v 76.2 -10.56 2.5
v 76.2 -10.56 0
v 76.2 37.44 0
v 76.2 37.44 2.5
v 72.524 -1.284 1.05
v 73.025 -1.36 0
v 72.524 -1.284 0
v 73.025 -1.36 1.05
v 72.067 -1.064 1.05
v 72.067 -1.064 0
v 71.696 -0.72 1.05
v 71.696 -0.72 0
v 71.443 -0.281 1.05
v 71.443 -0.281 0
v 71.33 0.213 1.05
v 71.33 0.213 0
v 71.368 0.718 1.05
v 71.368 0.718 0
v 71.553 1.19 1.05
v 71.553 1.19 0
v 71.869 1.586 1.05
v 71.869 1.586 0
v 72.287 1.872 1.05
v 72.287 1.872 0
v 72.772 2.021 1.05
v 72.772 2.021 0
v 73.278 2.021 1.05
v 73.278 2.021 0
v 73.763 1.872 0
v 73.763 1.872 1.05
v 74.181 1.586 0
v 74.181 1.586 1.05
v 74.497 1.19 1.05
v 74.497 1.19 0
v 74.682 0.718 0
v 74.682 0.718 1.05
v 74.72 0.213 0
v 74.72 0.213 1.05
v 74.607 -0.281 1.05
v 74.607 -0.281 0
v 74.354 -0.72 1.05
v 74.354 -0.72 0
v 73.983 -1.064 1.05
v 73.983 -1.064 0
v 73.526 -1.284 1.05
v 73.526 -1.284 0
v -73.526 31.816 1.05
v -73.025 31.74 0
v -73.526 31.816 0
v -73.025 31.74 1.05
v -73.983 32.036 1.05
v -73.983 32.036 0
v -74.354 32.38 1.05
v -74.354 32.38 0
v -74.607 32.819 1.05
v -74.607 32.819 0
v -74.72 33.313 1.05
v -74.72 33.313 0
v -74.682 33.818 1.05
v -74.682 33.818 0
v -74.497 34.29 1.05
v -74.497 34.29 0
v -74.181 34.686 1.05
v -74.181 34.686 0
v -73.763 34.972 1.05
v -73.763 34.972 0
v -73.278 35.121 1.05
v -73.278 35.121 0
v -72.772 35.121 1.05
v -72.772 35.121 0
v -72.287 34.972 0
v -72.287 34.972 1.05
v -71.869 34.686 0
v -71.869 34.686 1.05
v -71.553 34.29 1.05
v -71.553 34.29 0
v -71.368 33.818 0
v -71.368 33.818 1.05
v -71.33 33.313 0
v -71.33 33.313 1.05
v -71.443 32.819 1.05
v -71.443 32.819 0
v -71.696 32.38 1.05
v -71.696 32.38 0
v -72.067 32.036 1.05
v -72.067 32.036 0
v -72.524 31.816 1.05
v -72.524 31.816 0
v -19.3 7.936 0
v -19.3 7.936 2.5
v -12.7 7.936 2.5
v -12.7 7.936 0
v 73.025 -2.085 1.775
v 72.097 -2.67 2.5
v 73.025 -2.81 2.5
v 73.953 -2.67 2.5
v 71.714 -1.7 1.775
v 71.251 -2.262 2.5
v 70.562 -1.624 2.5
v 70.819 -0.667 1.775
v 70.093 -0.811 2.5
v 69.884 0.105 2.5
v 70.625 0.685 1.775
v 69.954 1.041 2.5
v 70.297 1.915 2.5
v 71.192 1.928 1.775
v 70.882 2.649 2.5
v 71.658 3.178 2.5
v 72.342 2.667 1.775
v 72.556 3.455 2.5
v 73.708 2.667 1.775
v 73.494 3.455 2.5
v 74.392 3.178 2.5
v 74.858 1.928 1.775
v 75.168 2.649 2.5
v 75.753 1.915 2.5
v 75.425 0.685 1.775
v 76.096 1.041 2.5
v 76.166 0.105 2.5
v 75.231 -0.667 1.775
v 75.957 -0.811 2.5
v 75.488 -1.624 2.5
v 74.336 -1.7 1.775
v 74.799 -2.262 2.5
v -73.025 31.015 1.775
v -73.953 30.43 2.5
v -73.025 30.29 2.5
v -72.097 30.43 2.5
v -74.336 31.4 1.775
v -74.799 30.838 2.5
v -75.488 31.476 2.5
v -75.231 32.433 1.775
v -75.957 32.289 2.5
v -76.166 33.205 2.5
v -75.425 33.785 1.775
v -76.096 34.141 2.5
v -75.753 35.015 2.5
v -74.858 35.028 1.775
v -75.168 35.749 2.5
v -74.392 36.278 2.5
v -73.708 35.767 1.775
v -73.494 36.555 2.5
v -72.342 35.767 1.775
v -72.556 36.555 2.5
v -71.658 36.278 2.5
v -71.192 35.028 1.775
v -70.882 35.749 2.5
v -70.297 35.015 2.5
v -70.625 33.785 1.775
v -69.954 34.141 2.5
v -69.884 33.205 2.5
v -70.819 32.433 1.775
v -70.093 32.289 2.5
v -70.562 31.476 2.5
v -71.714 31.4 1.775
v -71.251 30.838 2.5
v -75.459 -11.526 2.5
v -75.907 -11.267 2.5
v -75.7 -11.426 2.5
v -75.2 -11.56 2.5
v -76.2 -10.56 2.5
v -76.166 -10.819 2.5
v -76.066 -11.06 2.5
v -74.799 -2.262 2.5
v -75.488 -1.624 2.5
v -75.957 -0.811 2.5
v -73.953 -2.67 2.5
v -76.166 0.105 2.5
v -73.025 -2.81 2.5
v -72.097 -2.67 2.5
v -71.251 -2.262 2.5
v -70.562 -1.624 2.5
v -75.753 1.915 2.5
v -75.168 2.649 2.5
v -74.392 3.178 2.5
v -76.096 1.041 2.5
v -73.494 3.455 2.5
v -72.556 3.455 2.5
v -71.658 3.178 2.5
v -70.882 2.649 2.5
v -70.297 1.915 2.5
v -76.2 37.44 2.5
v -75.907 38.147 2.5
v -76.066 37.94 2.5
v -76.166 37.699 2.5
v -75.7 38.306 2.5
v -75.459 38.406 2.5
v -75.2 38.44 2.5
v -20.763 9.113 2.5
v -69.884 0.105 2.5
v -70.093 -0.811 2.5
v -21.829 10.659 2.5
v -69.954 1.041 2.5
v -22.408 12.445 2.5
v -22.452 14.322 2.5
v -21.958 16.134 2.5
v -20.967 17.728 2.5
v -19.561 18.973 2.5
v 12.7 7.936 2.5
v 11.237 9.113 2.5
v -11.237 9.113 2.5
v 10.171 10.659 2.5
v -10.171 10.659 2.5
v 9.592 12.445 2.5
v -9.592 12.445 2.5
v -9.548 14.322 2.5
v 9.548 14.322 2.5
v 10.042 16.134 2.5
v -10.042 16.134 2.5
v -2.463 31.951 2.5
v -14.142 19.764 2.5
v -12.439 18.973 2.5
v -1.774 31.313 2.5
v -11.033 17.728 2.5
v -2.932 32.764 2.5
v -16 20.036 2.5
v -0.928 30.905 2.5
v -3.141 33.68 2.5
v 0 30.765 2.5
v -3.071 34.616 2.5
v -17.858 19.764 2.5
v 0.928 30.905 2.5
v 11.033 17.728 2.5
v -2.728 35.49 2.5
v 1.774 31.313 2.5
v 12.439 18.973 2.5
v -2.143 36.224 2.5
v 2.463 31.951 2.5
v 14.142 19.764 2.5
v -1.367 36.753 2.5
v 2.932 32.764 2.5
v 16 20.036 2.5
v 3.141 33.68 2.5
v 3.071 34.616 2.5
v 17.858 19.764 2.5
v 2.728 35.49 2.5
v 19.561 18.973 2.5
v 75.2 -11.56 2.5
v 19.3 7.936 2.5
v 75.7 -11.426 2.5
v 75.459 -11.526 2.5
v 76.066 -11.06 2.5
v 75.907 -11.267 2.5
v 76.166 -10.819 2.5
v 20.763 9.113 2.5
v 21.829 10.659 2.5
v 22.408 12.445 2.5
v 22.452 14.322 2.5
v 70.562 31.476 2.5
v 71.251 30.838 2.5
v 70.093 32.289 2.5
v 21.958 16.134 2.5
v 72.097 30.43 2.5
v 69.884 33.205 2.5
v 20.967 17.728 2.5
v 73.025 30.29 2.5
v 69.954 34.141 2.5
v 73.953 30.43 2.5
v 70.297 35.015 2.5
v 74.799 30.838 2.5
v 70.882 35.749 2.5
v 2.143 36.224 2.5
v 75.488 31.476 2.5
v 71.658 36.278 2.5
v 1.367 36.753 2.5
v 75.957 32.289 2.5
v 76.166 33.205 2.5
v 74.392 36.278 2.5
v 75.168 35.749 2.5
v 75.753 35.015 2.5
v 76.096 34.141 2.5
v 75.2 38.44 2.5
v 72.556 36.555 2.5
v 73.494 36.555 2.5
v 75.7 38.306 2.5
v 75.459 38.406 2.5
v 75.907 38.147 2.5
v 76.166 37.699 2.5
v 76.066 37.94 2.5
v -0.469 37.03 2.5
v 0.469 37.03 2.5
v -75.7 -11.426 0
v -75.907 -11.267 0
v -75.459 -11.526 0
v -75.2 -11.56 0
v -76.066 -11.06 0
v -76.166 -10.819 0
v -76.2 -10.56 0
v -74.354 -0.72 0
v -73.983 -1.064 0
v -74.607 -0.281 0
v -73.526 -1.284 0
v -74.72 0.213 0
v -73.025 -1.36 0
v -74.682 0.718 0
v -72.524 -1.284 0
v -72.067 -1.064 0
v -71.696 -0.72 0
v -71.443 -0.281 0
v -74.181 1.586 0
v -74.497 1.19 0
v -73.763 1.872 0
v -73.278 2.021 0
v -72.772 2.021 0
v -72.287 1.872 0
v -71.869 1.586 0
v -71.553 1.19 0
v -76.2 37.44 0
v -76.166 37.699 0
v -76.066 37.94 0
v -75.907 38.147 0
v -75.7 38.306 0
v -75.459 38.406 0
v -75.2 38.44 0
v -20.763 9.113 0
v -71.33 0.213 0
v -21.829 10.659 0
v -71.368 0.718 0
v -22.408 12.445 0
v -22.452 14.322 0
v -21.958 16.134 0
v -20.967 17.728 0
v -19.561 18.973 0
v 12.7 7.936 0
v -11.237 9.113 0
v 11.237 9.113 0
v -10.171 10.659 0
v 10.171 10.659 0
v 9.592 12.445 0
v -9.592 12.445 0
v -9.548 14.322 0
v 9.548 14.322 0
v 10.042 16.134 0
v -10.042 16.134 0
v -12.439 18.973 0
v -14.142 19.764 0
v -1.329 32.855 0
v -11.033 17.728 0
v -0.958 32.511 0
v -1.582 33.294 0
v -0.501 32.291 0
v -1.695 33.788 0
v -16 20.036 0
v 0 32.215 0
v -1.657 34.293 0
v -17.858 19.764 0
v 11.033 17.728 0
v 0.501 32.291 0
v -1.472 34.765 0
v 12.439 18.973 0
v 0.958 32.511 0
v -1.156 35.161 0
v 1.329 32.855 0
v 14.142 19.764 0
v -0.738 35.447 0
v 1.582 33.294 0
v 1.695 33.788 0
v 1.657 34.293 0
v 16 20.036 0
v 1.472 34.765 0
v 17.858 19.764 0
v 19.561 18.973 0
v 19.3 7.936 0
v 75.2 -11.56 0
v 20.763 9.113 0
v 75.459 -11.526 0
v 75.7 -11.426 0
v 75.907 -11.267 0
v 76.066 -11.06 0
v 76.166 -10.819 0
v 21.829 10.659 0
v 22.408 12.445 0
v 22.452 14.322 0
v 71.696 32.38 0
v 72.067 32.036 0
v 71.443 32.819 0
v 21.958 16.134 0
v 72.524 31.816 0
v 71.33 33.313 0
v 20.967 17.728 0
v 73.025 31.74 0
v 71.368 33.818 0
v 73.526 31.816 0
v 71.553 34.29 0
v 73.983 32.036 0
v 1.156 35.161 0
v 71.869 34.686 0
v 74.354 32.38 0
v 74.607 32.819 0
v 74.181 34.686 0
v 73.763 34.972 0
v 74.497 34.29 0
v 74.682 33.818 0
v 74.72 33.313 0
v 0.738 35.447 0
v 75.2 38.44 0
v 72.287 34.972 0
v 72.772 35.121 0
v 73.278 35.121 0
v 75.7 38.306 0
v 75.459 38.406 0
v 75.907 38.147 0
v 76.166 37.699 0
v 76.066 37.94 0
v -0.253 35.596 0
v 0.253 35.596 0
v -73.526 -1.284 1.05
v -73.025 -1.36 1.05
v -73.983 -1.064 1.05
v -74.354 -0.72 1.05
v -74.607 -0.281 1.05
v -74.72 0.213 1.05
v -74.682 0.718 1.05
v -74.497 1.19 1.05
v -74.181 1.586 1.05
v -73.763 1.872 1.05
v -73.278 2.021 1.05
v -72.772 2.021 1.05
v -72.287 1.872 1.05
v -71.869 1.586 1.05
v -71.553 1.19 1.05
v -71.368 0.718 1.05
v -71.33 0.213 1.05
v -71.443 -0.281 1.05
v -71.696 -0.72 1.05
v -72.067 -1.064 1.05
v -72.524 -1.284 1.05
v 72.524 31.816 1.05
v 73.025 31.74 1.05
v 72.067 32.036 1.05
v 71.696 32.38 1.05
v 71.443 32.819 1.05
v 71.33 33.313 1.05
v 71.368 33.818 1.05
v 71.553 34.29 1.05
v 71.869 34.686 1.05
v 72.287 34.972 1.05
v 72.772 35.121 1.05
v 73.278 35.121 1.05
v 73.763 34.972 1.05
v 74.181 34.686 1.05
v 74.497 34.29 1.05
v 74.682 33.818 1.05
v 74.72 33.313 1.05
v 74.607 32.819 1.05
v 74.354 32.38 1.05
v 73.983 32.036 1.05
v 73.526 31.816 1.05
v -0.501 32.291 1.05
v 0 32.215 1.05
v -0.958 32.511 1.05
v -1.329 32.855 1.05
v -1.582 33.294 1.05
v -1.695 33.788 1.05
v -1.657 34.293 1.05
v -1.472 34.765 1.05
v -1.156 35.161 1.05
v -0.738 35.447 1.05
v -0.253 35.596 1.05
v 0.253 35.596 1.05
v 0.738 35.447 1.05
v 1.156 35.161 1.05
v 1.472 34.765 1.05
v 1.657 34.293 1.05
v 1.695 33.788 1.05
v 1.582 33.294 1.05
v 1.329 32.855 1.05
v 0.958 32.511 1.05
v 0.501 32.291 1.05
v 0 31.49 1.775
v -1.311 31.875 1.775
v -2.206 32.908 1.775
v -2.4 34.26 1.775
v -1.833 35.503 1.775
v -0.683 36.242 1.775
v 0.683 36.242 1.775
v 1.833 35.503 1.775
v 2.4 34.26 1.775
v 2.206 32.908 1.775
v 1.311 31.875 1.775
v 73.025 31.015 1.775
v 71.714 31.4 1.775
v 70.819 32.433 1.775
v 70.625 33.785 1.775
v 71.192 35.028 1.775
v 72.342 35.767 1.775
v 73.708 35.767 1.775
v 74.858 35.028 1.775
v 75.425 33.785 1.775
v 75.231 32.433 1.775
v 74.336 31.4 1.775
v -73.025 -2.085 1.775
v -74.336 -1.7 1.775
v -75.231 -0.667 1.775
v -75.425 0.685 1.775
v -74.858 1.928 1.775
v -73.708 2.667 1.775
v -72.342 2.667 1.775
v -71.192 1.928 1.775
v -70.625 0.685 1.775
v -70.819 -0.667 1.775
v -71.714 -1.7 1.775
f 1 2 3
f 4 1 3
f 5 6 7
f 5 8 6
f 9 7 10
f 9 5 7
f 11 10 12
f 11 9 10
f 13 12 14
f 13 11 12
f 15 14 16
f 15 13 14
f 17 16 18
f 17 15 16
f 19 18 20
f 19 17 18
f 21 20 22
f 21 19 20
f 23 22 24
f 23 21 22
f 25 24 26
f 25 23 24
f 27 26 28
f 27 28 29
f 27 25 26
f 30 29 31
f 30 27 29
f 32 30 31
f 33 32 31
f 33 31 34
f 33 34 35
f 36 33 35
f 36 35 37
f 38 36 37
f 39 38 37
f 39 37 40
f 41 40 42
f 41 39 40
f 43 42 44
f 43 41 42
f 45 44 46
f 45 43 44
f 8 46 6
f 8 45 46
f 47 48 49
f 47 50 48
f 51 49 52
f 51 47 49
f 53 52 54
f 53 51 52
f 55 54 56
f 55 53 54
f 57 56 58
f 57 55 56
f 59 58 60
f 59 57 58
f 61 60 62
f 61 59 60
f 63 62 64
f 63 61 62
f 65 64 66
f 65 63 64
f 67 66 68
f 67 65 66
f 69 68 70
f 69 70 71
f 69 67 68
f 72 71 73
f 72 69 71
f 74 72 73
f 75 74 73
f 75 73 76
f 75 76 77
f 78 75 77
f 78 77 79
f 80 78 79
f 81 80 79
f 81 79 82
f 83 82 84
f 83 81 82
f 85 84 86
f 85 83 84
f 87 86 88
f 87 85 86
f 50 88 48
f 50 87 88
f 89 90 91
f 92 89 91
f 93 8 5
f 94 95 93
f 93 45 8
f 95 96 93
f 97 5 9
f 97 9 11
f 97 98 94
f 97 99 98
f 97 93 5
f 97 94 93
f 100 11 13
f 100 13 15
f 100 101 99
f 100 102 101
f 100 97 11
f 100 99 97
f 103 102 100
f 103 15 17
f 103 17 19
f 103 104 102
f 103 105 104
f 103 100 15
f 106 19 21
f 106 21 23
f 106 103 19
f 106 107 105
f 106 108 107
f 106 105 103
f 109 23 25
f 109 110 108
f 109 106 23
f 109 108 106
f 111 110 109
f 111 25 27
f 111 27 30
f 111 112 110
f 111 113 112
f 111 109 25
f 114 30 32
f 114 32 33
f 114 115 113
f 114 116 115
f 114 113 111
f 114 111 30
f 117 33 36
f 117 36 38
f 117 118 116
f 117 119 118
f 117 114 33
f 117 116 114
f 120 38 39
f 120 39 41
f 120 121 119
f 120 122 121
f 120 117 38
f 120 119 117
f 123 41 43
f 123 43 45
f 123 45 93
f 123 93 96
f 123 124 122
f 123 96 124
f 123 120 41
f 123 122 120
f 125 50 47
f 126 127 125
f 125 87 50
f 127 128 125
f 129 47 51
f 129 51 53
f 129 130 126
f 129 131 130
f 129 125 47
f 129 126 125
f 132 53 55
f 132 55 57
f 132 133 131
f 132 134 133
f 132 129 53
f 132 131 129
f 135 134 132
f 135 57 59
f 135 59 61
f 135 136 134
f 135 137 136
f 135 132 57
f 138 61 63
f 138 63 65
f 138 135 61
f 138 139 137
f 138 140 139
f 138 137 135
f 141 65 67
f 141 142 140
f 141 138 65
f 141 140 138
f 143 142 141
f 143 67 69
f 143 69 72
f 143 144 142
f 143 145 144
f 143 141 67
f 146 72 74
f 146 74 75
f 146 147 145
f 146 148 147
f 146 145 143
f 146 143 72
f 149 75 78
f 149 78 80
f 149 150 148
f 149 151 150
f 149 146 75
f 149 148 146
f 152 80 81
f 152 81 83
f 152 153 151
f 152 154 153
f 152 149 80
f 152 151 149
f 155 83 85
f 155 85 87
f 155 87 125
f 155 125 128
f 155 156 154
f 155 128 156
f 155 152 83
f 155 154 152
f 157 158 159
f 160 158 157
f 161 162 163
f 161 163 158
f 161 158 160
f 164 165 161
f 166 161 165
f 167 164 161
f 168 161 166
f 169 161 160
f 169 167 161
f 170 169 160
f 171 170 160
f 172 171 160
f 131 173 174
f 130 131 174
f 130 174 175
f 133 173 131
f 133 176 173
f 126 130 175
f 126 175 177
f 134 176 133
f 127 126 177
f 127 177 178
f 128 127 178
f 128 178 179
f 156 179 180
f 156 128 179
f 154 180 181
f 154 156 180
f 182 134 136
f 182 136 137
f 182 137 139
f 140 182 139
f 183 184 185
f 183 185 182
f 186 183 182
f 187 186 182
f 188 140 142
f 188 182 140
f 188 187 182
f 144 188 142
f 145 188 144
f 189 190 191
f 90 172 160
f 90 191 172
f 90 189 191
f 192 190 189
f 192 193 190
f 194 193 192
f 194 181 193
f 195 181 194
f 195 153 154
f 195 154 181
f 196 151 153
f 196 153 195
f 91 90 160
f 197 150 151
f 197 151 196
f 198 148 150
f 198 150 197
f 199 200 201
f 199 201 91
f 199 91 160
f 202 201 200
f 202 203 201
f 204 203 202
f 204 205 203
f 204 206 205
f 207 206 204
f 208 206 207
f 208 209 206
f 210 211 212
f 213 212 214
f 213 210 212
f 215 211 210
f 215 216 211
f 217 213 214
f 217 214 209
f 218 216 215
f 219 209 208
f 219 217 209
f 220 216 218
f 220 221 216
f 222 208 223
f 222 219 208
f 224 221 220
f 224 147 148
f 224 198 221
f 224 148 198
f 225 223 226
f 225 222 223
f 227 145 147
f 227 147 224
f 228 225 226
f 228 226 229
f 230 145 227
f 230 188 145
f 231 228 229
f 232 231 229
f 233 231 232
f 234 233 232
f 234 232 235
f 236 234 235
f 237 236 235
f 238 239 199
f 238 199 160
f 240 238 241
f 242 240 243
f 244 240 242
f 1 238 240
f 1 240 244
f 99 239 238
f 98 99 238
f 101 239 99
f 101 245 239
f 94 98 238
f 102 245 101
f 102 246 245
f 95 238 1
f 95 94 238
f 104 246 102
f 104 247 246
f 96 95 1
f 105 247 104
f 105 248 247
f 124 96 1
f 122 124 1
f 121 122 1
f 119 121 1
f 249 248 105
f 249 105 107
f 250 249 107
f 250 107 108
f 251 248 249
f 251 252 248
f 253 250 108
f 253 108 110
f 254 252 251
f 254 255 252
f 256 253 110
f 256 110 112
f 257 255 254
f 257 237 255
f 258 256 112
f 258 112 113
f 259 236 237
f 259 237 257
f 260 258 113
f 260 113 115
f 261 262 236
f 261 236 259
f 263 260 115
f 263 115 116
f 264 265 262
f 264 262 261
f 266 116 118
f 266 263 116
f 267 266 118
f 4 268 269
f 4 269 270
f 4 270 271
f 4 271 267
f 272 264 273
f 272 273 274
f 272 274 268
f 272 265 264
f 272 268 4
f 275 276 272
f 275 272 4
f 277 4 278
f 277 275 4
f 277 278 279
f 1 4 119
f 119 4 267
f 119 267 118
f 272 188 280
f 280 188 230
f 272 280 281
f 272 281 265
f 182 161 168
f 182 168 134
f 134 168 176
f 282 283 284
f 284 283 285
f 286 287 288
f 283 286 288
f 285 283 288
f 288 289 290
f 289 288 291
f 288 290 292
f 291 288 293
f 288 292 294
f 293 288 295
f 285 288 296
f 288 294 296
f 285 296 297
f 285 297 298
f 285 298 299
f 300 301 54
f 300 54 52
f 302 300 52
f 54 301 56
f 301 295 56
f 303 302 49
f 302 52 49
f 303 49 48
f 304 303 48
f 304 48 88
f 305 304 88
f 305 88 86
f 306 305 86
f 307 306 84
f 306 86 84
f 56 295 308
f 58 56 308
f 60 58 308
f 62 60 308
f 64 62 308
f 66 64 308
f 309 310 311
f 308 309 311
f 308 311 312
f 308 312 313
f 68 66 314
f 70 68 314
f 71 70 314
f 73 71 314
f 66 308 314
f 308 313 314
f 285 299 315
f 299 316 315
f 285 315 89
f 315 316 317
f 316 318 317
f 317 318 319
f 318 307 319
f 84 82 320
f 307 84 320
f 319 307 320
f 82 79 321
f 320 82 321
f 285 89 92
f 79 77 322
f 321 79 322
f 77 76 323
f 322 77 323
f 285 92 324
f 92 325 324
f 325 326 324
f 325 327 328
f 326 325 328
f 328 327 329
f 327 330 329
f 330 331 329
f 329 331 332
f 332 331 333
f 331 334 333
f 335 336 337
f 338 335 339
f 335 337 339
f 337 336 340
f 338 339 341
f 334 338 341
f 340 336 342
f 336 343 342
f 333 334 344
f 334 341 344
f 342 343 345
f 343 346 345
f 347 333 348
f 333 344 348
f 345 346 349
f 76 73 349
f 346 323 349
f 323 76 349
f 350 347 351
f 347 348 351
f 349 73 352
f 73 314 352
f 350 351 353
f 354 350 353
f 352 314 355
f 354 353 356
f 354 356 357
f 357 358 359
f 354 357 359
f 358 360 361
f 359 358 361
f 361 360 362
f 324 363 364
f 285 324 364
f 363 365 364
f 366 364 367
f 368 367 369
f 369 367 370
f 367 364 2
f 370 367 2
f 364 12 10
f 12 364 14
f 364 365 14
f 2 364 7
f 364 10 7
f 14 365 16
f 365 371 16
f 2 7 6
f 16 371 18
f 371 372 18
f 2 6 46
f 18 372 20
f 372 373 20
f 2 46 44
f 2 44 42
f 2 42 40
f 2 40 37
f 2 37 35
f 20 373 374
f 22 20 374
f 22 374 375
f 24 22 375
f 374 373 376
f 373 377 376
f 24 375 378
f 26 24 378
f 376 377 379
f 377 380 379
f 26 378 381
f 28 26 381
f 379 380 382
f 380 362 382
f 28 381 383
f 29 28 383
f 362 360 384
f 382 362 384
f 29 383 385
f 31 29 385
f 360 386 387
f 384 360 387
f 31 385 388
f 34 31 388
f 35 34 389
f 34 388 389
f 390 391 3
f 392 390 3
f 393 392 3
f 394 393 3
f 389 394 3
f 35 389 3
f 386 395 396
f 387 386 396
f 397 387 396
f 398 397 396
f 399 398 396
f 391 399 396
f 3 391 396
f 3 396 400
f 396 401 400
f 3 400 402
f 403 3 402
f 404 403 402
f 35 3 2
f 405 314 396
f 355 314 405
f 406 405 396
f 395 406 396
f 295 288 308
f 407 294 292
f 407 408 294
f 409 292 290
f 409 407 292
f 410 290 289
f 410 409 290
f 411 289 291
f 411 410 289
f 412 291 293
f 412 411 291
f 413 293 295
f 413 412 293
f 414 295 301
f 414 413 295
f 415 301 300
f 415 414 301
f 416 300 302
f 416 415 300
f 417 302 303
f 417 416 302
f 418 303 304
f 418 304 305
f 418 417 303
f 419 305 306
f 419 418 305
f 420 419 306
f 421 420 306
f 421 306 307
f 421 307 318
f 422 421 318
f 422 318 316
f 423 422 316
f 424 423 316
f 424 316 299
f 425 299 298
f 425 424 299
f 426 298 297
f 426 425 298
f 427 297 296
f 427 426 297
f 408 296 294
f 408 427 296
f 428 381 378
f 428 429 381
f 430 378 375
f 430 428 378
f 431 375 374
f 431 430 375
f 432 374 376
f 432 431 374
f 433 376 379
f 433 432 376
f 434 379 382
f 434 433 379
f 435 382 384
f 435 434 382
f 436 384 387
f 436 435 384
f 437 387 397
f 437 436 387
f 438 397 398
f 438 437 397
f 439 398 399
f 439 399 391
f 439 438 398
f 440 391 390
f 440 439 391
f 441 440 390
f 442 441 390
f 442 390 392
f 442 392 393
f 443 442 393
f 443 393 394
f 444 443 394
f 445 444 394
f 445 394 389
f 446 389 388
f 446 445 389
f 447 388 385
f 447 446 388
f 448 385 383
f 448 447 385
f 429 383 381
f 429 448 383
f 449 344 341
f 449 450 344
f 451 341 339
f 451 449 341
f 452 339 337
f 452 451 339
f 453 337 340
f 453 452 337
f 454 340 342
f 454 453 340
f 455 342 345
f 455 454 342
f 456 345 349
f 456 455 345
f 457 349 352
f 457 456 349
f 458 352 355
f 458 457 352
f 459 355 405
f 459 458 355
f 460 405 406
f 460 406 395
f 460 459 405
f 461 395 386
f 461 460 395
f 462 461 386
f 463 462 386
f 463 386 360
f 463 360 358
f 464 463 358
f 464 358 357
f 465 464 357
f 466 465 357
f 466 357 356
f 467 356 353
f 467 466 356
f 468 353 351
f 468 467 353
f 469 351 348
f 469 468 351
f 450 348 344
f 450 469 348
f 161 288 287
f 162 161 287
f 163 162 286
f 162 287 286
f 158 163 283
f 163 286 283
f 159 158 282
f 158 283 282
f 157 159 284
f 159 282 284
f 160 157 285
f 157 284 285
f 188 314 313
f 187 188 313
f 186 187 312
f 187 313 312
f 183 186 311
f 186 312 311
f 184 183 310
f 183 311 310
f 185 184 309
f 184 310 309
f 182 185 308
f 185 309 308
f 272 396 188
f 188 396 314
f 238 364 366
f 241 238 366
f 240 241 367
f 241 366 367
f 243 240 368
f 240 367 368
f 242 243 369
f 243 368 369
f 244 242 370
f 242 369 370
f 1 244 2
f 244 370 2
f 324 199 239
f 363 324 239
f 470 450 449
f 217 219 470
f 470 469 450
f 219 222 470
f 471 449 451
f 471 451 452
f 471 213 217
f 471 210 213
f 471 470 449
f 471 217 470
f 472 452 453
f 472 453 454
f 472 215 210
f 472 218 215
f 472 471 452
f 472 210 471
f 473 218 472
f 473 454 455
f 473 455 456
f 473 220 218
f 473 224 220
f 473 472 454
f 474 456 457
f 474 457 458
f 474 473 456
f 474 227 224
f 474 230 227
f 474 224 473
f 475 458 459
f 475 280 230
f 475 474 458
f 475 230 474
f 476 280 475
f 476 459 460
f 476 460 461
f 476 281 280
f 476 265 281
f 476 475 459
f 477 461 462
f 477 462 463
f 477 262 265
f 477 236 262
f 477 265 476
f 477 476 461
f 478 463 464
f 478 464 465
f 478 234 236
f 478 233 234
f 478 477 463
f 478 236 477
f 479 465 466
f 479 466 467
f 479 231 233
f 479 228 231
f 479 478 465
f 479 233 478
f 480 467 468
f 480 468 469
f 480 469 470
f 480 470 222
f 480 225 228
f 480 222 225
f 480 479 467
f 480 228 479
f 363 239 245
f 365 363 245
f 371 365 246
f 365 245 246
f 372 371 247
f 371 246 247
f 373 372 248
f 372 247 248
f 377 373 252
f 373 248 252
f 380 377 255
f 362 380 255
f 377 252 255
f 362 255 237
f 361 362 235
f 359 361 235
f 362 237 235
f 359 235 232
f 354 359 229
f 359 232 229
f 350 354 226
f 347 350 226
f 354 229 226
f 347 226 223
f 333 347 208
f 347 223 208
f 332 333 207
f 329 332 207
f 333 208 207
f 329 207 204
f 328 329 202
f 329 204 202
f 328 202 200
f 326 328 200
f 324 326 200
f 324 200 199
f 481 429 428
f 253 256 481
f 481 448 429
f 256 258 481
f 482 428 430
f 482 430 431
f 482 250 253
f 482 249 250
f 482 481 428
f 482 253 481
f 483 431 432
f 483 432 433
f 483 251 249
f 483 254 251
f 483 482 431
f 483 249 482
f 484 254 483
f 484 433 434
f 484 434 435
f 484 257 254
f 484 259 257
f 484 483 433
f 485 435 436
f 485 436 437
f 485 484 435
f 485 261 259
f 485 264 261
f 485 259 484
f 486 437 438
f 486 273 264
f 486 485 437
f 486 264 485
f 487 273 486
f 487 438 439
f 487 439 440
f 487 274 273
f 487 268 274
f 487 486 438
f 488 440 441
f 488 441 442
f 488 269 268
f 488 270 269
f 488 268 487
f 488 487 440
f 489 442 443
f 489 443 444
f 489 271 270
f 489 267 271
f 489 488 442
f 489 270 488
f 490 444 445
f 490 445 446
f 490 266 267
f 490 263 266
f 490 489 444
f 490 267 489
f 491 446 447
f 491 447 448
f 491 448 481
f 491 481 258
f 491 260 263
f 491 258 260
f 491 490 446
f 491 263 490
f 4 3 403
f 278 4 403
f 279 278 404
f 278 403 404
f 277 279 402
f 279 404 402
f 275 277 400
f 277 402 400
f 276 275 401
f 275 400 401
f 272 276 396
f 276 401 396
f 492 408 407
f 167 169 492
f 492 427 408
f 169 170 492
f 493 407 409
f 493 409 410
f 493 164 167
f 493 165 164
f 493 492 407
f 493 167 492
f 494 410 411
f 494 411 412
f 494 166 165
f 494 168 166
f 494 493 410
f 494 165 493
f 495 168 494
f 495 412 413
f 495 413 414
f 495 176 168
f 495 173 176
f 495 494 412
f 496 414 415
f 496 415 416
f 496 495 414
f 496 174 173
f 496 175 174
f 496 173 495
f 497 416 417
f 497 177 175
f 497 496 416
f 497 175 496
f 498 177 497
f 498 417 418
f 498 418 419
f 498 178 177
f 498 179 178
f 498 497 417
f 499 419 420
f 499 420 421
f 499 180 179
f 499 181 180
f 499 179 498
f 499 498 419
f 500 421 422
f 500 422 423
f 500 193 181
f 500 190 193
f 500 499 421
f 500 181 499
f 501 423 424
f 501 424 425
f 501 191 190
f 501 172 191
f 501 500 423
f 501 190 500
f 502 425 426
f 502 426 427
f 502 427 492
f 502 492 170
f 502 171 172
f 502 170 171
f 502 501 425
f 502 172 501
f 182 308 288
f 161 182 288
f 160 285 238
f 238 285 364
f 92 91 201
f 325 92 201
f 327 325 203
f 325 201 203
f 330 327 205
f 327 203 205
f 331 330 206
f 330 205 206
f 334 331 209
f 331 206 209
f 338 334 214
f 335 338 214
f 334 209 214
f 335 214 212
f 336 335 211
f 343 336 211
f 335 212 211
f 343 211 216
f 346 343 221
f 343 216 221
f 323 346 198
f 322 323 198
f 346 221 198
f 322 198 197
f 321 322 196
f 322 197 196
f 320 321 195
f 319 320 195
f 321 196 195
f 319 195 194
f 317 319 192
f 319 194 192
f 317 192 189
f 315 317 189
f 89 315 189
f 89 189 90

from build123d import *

# Parameters (mm, degrees)
BOSS_EXTRUDE1_DEPTH                          = 2.5
CSK_FOR_M3_COUNTERSUNK_FLAT_HEAD_SCR_2_COUNT = 2
CSK_FOR_M3_COUNTERSUNK_FLAT_HEAD_SCR_2_PITCH = 33.1
CSK_FOR_M3_COUNTERSUNK_FLAT_HEAD_SCR_3_COUNT = 2
CSK_FOR_M3_COUNTERSUNK_FLAT_HEAD_SCR_3_PITCH = 73.026544956
CSK_FOR_M3_COUNTERSUNK_FLAT_HEAD_SCR_4_COUNT = 2
CSK_FOR_M3_COUNTERSUNK_FLAT_HEAD_SCR_4_PITCH = 146.05
CSK_FOR_M3_COUNTERSUNK_FLAT_HEAD_SCR_5_COUNT = 2
CSK_FOR_M3_COUNTERSUNK_FLAT_HEAD_SCR_5_PITCH = 149.753839684
CUT_EXTRUDE1_DEPTH                           = 86.383473485


with BuildPart() as part:
    # Sketch2 → Boss-Extrude1 (new body)
    with BuildSketch(Plane.XY):
        with BuildLine():
            Line((-75.2, -11.559818622), (75.2, -11.559818622))
            ThreePointArc((75.2, -11.559818622), (75.907106781, -11.266925403), (76.2, -10.559818622))
            Line((76.2, -10.559818622), (76.2, 37.440181378))
            ThreePointArc((76.2, 37.440181378), (75.907106781, 38.147288159), (75.2, 38.440181378))
            Line((75.2, 38.440181378), (-75.2, 38.440181378))
            ThreePointArc((-75.2, 38.440181378), (-75.907106781, 38.147288159), (-76.2, 37.440181378))
            Line((-76.2, 37.440181378), (-76.2, -10.559818622))
            ThreePointArc((-76.2, -10.559818622), (-75.907106781, -11.266925403), (-75.2, -11.559818622))
        make_face()
    extrude(amount=BOSS_EXTRUDE1_DEPTH)

    # Sketch5 → CSK for M3 Countersunk Flat Head Screw1 (revolve, cut)
    with BuildSketch(Plane(origin=(-73.025, 33.440181378, 2.5), x_dir=(0, -1, 0), z_dir=(1, 0, 0))):
        Polygon((0, 0), (0, 2.5), (1.7, 2.5), (1.7, 1.45), (3.15, 0), align=None)
    csk_for_m3_countersunk_flat_head_screw1 = revolve(axis=Axis((-73.025, 33.440181378, 8.85), (0, 0, -1)), mode=Mode.SUBTRACT)

    # CSK for M3 Countersunk Flat Head Scr 2: CSK for M3 Countersunk Flat Head Screw1 ×2
    with Locations(*[(0, -i * CSK_FOR_M3_COUNTERSUNK_FLAT_HEAD_SCR_2_PITCH, 0) for i in range(1, CSK_FOR_M3_COUNTERSUNK_FLAT_HEAD_SCR_2_COUNT)]):
        add(csk_for_m3_countersunk_flat_head_screw1, mode=Mode.SUBTRACT)

    # CSK for M3 Countersunk Flat Head Scr 3: CSK for M3 Countersunk Flat Head Screw1 ×2
    with Locations(*[Vector(0.9999788439186126, 0.006504745590340633, 0) * (i * CSK_FOR_M3_COUNTERSUNK_FLAT_HEAD_SCR_3_PITCH) for i in range(1, CSK_FOR_M3_COUNTERSUNK_FLAT_HEAD_SCR_3_COUNT)]):
        add(csk_for_m3_countersunk_flat_head_screw1, mode=Mode.SUBTRACT)

    # CSK for M3 Countersunk Flat Head Scr 4: CSK for M3 Countersunk Flat Head Screw1 ×2
    with Locations(*[(i * CSK_FOR_M3_COUNTERSUNK_FLAT_HEAD_SCR_4_PITCH, 0, 0) for i in range(1, CSK_FOR_M3_COUNTERSUNK_FLAT_HEAD_SCR_4_COUNT)]):
        add(csk_for_m3_countersunk_flat_head_screw1, mode=Mode.SUBTRACT)

    # CSK for M3 Countersunk Flat Head Scr 5: CSK for M3 Countersunk Flat Head Screw1 ×2
    with Locations(*[Vector(0.9752671471296755, -0.22102939109888511, 0) * (i * CSK_FOR_M3_COUNTERSUNK_FLAT_HEAD_SCR_5_PITCH) for i in range(1, CSK_FOR_M3_COUNTERSUNK_FLAT_HEAD_SCR_5_COUNT)]):
        add(csk_for_m3_countersunk_flat_head_screw1, mode=Mode.SUBTRACT)

    # Sketch6 → Cut-Extrude1 (cut, through all)
    with BuildSketch(Plane.XY.offset(2.5)):
        with BuildLine():
            ThreePointArc((-12.7, 7.935569815), (-16, 20.035569815), (-19.3, 7.935569815))
            Line((-19.3, 7.935569815), (-12.7, 7.935569815))
        make_face()
        with BuildLine():
            ThreePointArc((19.3, 7.935569815), (16, 20.035569815), (12.7, 7.935569815))
            Line((12.7, 7.935569815), (19.3, 7.935569815))
        make_face()
    extrude(amount=-CUT_EXTRUDE1_DEPTH, mode=Mode.SUBTRACT)


solid = part.part
